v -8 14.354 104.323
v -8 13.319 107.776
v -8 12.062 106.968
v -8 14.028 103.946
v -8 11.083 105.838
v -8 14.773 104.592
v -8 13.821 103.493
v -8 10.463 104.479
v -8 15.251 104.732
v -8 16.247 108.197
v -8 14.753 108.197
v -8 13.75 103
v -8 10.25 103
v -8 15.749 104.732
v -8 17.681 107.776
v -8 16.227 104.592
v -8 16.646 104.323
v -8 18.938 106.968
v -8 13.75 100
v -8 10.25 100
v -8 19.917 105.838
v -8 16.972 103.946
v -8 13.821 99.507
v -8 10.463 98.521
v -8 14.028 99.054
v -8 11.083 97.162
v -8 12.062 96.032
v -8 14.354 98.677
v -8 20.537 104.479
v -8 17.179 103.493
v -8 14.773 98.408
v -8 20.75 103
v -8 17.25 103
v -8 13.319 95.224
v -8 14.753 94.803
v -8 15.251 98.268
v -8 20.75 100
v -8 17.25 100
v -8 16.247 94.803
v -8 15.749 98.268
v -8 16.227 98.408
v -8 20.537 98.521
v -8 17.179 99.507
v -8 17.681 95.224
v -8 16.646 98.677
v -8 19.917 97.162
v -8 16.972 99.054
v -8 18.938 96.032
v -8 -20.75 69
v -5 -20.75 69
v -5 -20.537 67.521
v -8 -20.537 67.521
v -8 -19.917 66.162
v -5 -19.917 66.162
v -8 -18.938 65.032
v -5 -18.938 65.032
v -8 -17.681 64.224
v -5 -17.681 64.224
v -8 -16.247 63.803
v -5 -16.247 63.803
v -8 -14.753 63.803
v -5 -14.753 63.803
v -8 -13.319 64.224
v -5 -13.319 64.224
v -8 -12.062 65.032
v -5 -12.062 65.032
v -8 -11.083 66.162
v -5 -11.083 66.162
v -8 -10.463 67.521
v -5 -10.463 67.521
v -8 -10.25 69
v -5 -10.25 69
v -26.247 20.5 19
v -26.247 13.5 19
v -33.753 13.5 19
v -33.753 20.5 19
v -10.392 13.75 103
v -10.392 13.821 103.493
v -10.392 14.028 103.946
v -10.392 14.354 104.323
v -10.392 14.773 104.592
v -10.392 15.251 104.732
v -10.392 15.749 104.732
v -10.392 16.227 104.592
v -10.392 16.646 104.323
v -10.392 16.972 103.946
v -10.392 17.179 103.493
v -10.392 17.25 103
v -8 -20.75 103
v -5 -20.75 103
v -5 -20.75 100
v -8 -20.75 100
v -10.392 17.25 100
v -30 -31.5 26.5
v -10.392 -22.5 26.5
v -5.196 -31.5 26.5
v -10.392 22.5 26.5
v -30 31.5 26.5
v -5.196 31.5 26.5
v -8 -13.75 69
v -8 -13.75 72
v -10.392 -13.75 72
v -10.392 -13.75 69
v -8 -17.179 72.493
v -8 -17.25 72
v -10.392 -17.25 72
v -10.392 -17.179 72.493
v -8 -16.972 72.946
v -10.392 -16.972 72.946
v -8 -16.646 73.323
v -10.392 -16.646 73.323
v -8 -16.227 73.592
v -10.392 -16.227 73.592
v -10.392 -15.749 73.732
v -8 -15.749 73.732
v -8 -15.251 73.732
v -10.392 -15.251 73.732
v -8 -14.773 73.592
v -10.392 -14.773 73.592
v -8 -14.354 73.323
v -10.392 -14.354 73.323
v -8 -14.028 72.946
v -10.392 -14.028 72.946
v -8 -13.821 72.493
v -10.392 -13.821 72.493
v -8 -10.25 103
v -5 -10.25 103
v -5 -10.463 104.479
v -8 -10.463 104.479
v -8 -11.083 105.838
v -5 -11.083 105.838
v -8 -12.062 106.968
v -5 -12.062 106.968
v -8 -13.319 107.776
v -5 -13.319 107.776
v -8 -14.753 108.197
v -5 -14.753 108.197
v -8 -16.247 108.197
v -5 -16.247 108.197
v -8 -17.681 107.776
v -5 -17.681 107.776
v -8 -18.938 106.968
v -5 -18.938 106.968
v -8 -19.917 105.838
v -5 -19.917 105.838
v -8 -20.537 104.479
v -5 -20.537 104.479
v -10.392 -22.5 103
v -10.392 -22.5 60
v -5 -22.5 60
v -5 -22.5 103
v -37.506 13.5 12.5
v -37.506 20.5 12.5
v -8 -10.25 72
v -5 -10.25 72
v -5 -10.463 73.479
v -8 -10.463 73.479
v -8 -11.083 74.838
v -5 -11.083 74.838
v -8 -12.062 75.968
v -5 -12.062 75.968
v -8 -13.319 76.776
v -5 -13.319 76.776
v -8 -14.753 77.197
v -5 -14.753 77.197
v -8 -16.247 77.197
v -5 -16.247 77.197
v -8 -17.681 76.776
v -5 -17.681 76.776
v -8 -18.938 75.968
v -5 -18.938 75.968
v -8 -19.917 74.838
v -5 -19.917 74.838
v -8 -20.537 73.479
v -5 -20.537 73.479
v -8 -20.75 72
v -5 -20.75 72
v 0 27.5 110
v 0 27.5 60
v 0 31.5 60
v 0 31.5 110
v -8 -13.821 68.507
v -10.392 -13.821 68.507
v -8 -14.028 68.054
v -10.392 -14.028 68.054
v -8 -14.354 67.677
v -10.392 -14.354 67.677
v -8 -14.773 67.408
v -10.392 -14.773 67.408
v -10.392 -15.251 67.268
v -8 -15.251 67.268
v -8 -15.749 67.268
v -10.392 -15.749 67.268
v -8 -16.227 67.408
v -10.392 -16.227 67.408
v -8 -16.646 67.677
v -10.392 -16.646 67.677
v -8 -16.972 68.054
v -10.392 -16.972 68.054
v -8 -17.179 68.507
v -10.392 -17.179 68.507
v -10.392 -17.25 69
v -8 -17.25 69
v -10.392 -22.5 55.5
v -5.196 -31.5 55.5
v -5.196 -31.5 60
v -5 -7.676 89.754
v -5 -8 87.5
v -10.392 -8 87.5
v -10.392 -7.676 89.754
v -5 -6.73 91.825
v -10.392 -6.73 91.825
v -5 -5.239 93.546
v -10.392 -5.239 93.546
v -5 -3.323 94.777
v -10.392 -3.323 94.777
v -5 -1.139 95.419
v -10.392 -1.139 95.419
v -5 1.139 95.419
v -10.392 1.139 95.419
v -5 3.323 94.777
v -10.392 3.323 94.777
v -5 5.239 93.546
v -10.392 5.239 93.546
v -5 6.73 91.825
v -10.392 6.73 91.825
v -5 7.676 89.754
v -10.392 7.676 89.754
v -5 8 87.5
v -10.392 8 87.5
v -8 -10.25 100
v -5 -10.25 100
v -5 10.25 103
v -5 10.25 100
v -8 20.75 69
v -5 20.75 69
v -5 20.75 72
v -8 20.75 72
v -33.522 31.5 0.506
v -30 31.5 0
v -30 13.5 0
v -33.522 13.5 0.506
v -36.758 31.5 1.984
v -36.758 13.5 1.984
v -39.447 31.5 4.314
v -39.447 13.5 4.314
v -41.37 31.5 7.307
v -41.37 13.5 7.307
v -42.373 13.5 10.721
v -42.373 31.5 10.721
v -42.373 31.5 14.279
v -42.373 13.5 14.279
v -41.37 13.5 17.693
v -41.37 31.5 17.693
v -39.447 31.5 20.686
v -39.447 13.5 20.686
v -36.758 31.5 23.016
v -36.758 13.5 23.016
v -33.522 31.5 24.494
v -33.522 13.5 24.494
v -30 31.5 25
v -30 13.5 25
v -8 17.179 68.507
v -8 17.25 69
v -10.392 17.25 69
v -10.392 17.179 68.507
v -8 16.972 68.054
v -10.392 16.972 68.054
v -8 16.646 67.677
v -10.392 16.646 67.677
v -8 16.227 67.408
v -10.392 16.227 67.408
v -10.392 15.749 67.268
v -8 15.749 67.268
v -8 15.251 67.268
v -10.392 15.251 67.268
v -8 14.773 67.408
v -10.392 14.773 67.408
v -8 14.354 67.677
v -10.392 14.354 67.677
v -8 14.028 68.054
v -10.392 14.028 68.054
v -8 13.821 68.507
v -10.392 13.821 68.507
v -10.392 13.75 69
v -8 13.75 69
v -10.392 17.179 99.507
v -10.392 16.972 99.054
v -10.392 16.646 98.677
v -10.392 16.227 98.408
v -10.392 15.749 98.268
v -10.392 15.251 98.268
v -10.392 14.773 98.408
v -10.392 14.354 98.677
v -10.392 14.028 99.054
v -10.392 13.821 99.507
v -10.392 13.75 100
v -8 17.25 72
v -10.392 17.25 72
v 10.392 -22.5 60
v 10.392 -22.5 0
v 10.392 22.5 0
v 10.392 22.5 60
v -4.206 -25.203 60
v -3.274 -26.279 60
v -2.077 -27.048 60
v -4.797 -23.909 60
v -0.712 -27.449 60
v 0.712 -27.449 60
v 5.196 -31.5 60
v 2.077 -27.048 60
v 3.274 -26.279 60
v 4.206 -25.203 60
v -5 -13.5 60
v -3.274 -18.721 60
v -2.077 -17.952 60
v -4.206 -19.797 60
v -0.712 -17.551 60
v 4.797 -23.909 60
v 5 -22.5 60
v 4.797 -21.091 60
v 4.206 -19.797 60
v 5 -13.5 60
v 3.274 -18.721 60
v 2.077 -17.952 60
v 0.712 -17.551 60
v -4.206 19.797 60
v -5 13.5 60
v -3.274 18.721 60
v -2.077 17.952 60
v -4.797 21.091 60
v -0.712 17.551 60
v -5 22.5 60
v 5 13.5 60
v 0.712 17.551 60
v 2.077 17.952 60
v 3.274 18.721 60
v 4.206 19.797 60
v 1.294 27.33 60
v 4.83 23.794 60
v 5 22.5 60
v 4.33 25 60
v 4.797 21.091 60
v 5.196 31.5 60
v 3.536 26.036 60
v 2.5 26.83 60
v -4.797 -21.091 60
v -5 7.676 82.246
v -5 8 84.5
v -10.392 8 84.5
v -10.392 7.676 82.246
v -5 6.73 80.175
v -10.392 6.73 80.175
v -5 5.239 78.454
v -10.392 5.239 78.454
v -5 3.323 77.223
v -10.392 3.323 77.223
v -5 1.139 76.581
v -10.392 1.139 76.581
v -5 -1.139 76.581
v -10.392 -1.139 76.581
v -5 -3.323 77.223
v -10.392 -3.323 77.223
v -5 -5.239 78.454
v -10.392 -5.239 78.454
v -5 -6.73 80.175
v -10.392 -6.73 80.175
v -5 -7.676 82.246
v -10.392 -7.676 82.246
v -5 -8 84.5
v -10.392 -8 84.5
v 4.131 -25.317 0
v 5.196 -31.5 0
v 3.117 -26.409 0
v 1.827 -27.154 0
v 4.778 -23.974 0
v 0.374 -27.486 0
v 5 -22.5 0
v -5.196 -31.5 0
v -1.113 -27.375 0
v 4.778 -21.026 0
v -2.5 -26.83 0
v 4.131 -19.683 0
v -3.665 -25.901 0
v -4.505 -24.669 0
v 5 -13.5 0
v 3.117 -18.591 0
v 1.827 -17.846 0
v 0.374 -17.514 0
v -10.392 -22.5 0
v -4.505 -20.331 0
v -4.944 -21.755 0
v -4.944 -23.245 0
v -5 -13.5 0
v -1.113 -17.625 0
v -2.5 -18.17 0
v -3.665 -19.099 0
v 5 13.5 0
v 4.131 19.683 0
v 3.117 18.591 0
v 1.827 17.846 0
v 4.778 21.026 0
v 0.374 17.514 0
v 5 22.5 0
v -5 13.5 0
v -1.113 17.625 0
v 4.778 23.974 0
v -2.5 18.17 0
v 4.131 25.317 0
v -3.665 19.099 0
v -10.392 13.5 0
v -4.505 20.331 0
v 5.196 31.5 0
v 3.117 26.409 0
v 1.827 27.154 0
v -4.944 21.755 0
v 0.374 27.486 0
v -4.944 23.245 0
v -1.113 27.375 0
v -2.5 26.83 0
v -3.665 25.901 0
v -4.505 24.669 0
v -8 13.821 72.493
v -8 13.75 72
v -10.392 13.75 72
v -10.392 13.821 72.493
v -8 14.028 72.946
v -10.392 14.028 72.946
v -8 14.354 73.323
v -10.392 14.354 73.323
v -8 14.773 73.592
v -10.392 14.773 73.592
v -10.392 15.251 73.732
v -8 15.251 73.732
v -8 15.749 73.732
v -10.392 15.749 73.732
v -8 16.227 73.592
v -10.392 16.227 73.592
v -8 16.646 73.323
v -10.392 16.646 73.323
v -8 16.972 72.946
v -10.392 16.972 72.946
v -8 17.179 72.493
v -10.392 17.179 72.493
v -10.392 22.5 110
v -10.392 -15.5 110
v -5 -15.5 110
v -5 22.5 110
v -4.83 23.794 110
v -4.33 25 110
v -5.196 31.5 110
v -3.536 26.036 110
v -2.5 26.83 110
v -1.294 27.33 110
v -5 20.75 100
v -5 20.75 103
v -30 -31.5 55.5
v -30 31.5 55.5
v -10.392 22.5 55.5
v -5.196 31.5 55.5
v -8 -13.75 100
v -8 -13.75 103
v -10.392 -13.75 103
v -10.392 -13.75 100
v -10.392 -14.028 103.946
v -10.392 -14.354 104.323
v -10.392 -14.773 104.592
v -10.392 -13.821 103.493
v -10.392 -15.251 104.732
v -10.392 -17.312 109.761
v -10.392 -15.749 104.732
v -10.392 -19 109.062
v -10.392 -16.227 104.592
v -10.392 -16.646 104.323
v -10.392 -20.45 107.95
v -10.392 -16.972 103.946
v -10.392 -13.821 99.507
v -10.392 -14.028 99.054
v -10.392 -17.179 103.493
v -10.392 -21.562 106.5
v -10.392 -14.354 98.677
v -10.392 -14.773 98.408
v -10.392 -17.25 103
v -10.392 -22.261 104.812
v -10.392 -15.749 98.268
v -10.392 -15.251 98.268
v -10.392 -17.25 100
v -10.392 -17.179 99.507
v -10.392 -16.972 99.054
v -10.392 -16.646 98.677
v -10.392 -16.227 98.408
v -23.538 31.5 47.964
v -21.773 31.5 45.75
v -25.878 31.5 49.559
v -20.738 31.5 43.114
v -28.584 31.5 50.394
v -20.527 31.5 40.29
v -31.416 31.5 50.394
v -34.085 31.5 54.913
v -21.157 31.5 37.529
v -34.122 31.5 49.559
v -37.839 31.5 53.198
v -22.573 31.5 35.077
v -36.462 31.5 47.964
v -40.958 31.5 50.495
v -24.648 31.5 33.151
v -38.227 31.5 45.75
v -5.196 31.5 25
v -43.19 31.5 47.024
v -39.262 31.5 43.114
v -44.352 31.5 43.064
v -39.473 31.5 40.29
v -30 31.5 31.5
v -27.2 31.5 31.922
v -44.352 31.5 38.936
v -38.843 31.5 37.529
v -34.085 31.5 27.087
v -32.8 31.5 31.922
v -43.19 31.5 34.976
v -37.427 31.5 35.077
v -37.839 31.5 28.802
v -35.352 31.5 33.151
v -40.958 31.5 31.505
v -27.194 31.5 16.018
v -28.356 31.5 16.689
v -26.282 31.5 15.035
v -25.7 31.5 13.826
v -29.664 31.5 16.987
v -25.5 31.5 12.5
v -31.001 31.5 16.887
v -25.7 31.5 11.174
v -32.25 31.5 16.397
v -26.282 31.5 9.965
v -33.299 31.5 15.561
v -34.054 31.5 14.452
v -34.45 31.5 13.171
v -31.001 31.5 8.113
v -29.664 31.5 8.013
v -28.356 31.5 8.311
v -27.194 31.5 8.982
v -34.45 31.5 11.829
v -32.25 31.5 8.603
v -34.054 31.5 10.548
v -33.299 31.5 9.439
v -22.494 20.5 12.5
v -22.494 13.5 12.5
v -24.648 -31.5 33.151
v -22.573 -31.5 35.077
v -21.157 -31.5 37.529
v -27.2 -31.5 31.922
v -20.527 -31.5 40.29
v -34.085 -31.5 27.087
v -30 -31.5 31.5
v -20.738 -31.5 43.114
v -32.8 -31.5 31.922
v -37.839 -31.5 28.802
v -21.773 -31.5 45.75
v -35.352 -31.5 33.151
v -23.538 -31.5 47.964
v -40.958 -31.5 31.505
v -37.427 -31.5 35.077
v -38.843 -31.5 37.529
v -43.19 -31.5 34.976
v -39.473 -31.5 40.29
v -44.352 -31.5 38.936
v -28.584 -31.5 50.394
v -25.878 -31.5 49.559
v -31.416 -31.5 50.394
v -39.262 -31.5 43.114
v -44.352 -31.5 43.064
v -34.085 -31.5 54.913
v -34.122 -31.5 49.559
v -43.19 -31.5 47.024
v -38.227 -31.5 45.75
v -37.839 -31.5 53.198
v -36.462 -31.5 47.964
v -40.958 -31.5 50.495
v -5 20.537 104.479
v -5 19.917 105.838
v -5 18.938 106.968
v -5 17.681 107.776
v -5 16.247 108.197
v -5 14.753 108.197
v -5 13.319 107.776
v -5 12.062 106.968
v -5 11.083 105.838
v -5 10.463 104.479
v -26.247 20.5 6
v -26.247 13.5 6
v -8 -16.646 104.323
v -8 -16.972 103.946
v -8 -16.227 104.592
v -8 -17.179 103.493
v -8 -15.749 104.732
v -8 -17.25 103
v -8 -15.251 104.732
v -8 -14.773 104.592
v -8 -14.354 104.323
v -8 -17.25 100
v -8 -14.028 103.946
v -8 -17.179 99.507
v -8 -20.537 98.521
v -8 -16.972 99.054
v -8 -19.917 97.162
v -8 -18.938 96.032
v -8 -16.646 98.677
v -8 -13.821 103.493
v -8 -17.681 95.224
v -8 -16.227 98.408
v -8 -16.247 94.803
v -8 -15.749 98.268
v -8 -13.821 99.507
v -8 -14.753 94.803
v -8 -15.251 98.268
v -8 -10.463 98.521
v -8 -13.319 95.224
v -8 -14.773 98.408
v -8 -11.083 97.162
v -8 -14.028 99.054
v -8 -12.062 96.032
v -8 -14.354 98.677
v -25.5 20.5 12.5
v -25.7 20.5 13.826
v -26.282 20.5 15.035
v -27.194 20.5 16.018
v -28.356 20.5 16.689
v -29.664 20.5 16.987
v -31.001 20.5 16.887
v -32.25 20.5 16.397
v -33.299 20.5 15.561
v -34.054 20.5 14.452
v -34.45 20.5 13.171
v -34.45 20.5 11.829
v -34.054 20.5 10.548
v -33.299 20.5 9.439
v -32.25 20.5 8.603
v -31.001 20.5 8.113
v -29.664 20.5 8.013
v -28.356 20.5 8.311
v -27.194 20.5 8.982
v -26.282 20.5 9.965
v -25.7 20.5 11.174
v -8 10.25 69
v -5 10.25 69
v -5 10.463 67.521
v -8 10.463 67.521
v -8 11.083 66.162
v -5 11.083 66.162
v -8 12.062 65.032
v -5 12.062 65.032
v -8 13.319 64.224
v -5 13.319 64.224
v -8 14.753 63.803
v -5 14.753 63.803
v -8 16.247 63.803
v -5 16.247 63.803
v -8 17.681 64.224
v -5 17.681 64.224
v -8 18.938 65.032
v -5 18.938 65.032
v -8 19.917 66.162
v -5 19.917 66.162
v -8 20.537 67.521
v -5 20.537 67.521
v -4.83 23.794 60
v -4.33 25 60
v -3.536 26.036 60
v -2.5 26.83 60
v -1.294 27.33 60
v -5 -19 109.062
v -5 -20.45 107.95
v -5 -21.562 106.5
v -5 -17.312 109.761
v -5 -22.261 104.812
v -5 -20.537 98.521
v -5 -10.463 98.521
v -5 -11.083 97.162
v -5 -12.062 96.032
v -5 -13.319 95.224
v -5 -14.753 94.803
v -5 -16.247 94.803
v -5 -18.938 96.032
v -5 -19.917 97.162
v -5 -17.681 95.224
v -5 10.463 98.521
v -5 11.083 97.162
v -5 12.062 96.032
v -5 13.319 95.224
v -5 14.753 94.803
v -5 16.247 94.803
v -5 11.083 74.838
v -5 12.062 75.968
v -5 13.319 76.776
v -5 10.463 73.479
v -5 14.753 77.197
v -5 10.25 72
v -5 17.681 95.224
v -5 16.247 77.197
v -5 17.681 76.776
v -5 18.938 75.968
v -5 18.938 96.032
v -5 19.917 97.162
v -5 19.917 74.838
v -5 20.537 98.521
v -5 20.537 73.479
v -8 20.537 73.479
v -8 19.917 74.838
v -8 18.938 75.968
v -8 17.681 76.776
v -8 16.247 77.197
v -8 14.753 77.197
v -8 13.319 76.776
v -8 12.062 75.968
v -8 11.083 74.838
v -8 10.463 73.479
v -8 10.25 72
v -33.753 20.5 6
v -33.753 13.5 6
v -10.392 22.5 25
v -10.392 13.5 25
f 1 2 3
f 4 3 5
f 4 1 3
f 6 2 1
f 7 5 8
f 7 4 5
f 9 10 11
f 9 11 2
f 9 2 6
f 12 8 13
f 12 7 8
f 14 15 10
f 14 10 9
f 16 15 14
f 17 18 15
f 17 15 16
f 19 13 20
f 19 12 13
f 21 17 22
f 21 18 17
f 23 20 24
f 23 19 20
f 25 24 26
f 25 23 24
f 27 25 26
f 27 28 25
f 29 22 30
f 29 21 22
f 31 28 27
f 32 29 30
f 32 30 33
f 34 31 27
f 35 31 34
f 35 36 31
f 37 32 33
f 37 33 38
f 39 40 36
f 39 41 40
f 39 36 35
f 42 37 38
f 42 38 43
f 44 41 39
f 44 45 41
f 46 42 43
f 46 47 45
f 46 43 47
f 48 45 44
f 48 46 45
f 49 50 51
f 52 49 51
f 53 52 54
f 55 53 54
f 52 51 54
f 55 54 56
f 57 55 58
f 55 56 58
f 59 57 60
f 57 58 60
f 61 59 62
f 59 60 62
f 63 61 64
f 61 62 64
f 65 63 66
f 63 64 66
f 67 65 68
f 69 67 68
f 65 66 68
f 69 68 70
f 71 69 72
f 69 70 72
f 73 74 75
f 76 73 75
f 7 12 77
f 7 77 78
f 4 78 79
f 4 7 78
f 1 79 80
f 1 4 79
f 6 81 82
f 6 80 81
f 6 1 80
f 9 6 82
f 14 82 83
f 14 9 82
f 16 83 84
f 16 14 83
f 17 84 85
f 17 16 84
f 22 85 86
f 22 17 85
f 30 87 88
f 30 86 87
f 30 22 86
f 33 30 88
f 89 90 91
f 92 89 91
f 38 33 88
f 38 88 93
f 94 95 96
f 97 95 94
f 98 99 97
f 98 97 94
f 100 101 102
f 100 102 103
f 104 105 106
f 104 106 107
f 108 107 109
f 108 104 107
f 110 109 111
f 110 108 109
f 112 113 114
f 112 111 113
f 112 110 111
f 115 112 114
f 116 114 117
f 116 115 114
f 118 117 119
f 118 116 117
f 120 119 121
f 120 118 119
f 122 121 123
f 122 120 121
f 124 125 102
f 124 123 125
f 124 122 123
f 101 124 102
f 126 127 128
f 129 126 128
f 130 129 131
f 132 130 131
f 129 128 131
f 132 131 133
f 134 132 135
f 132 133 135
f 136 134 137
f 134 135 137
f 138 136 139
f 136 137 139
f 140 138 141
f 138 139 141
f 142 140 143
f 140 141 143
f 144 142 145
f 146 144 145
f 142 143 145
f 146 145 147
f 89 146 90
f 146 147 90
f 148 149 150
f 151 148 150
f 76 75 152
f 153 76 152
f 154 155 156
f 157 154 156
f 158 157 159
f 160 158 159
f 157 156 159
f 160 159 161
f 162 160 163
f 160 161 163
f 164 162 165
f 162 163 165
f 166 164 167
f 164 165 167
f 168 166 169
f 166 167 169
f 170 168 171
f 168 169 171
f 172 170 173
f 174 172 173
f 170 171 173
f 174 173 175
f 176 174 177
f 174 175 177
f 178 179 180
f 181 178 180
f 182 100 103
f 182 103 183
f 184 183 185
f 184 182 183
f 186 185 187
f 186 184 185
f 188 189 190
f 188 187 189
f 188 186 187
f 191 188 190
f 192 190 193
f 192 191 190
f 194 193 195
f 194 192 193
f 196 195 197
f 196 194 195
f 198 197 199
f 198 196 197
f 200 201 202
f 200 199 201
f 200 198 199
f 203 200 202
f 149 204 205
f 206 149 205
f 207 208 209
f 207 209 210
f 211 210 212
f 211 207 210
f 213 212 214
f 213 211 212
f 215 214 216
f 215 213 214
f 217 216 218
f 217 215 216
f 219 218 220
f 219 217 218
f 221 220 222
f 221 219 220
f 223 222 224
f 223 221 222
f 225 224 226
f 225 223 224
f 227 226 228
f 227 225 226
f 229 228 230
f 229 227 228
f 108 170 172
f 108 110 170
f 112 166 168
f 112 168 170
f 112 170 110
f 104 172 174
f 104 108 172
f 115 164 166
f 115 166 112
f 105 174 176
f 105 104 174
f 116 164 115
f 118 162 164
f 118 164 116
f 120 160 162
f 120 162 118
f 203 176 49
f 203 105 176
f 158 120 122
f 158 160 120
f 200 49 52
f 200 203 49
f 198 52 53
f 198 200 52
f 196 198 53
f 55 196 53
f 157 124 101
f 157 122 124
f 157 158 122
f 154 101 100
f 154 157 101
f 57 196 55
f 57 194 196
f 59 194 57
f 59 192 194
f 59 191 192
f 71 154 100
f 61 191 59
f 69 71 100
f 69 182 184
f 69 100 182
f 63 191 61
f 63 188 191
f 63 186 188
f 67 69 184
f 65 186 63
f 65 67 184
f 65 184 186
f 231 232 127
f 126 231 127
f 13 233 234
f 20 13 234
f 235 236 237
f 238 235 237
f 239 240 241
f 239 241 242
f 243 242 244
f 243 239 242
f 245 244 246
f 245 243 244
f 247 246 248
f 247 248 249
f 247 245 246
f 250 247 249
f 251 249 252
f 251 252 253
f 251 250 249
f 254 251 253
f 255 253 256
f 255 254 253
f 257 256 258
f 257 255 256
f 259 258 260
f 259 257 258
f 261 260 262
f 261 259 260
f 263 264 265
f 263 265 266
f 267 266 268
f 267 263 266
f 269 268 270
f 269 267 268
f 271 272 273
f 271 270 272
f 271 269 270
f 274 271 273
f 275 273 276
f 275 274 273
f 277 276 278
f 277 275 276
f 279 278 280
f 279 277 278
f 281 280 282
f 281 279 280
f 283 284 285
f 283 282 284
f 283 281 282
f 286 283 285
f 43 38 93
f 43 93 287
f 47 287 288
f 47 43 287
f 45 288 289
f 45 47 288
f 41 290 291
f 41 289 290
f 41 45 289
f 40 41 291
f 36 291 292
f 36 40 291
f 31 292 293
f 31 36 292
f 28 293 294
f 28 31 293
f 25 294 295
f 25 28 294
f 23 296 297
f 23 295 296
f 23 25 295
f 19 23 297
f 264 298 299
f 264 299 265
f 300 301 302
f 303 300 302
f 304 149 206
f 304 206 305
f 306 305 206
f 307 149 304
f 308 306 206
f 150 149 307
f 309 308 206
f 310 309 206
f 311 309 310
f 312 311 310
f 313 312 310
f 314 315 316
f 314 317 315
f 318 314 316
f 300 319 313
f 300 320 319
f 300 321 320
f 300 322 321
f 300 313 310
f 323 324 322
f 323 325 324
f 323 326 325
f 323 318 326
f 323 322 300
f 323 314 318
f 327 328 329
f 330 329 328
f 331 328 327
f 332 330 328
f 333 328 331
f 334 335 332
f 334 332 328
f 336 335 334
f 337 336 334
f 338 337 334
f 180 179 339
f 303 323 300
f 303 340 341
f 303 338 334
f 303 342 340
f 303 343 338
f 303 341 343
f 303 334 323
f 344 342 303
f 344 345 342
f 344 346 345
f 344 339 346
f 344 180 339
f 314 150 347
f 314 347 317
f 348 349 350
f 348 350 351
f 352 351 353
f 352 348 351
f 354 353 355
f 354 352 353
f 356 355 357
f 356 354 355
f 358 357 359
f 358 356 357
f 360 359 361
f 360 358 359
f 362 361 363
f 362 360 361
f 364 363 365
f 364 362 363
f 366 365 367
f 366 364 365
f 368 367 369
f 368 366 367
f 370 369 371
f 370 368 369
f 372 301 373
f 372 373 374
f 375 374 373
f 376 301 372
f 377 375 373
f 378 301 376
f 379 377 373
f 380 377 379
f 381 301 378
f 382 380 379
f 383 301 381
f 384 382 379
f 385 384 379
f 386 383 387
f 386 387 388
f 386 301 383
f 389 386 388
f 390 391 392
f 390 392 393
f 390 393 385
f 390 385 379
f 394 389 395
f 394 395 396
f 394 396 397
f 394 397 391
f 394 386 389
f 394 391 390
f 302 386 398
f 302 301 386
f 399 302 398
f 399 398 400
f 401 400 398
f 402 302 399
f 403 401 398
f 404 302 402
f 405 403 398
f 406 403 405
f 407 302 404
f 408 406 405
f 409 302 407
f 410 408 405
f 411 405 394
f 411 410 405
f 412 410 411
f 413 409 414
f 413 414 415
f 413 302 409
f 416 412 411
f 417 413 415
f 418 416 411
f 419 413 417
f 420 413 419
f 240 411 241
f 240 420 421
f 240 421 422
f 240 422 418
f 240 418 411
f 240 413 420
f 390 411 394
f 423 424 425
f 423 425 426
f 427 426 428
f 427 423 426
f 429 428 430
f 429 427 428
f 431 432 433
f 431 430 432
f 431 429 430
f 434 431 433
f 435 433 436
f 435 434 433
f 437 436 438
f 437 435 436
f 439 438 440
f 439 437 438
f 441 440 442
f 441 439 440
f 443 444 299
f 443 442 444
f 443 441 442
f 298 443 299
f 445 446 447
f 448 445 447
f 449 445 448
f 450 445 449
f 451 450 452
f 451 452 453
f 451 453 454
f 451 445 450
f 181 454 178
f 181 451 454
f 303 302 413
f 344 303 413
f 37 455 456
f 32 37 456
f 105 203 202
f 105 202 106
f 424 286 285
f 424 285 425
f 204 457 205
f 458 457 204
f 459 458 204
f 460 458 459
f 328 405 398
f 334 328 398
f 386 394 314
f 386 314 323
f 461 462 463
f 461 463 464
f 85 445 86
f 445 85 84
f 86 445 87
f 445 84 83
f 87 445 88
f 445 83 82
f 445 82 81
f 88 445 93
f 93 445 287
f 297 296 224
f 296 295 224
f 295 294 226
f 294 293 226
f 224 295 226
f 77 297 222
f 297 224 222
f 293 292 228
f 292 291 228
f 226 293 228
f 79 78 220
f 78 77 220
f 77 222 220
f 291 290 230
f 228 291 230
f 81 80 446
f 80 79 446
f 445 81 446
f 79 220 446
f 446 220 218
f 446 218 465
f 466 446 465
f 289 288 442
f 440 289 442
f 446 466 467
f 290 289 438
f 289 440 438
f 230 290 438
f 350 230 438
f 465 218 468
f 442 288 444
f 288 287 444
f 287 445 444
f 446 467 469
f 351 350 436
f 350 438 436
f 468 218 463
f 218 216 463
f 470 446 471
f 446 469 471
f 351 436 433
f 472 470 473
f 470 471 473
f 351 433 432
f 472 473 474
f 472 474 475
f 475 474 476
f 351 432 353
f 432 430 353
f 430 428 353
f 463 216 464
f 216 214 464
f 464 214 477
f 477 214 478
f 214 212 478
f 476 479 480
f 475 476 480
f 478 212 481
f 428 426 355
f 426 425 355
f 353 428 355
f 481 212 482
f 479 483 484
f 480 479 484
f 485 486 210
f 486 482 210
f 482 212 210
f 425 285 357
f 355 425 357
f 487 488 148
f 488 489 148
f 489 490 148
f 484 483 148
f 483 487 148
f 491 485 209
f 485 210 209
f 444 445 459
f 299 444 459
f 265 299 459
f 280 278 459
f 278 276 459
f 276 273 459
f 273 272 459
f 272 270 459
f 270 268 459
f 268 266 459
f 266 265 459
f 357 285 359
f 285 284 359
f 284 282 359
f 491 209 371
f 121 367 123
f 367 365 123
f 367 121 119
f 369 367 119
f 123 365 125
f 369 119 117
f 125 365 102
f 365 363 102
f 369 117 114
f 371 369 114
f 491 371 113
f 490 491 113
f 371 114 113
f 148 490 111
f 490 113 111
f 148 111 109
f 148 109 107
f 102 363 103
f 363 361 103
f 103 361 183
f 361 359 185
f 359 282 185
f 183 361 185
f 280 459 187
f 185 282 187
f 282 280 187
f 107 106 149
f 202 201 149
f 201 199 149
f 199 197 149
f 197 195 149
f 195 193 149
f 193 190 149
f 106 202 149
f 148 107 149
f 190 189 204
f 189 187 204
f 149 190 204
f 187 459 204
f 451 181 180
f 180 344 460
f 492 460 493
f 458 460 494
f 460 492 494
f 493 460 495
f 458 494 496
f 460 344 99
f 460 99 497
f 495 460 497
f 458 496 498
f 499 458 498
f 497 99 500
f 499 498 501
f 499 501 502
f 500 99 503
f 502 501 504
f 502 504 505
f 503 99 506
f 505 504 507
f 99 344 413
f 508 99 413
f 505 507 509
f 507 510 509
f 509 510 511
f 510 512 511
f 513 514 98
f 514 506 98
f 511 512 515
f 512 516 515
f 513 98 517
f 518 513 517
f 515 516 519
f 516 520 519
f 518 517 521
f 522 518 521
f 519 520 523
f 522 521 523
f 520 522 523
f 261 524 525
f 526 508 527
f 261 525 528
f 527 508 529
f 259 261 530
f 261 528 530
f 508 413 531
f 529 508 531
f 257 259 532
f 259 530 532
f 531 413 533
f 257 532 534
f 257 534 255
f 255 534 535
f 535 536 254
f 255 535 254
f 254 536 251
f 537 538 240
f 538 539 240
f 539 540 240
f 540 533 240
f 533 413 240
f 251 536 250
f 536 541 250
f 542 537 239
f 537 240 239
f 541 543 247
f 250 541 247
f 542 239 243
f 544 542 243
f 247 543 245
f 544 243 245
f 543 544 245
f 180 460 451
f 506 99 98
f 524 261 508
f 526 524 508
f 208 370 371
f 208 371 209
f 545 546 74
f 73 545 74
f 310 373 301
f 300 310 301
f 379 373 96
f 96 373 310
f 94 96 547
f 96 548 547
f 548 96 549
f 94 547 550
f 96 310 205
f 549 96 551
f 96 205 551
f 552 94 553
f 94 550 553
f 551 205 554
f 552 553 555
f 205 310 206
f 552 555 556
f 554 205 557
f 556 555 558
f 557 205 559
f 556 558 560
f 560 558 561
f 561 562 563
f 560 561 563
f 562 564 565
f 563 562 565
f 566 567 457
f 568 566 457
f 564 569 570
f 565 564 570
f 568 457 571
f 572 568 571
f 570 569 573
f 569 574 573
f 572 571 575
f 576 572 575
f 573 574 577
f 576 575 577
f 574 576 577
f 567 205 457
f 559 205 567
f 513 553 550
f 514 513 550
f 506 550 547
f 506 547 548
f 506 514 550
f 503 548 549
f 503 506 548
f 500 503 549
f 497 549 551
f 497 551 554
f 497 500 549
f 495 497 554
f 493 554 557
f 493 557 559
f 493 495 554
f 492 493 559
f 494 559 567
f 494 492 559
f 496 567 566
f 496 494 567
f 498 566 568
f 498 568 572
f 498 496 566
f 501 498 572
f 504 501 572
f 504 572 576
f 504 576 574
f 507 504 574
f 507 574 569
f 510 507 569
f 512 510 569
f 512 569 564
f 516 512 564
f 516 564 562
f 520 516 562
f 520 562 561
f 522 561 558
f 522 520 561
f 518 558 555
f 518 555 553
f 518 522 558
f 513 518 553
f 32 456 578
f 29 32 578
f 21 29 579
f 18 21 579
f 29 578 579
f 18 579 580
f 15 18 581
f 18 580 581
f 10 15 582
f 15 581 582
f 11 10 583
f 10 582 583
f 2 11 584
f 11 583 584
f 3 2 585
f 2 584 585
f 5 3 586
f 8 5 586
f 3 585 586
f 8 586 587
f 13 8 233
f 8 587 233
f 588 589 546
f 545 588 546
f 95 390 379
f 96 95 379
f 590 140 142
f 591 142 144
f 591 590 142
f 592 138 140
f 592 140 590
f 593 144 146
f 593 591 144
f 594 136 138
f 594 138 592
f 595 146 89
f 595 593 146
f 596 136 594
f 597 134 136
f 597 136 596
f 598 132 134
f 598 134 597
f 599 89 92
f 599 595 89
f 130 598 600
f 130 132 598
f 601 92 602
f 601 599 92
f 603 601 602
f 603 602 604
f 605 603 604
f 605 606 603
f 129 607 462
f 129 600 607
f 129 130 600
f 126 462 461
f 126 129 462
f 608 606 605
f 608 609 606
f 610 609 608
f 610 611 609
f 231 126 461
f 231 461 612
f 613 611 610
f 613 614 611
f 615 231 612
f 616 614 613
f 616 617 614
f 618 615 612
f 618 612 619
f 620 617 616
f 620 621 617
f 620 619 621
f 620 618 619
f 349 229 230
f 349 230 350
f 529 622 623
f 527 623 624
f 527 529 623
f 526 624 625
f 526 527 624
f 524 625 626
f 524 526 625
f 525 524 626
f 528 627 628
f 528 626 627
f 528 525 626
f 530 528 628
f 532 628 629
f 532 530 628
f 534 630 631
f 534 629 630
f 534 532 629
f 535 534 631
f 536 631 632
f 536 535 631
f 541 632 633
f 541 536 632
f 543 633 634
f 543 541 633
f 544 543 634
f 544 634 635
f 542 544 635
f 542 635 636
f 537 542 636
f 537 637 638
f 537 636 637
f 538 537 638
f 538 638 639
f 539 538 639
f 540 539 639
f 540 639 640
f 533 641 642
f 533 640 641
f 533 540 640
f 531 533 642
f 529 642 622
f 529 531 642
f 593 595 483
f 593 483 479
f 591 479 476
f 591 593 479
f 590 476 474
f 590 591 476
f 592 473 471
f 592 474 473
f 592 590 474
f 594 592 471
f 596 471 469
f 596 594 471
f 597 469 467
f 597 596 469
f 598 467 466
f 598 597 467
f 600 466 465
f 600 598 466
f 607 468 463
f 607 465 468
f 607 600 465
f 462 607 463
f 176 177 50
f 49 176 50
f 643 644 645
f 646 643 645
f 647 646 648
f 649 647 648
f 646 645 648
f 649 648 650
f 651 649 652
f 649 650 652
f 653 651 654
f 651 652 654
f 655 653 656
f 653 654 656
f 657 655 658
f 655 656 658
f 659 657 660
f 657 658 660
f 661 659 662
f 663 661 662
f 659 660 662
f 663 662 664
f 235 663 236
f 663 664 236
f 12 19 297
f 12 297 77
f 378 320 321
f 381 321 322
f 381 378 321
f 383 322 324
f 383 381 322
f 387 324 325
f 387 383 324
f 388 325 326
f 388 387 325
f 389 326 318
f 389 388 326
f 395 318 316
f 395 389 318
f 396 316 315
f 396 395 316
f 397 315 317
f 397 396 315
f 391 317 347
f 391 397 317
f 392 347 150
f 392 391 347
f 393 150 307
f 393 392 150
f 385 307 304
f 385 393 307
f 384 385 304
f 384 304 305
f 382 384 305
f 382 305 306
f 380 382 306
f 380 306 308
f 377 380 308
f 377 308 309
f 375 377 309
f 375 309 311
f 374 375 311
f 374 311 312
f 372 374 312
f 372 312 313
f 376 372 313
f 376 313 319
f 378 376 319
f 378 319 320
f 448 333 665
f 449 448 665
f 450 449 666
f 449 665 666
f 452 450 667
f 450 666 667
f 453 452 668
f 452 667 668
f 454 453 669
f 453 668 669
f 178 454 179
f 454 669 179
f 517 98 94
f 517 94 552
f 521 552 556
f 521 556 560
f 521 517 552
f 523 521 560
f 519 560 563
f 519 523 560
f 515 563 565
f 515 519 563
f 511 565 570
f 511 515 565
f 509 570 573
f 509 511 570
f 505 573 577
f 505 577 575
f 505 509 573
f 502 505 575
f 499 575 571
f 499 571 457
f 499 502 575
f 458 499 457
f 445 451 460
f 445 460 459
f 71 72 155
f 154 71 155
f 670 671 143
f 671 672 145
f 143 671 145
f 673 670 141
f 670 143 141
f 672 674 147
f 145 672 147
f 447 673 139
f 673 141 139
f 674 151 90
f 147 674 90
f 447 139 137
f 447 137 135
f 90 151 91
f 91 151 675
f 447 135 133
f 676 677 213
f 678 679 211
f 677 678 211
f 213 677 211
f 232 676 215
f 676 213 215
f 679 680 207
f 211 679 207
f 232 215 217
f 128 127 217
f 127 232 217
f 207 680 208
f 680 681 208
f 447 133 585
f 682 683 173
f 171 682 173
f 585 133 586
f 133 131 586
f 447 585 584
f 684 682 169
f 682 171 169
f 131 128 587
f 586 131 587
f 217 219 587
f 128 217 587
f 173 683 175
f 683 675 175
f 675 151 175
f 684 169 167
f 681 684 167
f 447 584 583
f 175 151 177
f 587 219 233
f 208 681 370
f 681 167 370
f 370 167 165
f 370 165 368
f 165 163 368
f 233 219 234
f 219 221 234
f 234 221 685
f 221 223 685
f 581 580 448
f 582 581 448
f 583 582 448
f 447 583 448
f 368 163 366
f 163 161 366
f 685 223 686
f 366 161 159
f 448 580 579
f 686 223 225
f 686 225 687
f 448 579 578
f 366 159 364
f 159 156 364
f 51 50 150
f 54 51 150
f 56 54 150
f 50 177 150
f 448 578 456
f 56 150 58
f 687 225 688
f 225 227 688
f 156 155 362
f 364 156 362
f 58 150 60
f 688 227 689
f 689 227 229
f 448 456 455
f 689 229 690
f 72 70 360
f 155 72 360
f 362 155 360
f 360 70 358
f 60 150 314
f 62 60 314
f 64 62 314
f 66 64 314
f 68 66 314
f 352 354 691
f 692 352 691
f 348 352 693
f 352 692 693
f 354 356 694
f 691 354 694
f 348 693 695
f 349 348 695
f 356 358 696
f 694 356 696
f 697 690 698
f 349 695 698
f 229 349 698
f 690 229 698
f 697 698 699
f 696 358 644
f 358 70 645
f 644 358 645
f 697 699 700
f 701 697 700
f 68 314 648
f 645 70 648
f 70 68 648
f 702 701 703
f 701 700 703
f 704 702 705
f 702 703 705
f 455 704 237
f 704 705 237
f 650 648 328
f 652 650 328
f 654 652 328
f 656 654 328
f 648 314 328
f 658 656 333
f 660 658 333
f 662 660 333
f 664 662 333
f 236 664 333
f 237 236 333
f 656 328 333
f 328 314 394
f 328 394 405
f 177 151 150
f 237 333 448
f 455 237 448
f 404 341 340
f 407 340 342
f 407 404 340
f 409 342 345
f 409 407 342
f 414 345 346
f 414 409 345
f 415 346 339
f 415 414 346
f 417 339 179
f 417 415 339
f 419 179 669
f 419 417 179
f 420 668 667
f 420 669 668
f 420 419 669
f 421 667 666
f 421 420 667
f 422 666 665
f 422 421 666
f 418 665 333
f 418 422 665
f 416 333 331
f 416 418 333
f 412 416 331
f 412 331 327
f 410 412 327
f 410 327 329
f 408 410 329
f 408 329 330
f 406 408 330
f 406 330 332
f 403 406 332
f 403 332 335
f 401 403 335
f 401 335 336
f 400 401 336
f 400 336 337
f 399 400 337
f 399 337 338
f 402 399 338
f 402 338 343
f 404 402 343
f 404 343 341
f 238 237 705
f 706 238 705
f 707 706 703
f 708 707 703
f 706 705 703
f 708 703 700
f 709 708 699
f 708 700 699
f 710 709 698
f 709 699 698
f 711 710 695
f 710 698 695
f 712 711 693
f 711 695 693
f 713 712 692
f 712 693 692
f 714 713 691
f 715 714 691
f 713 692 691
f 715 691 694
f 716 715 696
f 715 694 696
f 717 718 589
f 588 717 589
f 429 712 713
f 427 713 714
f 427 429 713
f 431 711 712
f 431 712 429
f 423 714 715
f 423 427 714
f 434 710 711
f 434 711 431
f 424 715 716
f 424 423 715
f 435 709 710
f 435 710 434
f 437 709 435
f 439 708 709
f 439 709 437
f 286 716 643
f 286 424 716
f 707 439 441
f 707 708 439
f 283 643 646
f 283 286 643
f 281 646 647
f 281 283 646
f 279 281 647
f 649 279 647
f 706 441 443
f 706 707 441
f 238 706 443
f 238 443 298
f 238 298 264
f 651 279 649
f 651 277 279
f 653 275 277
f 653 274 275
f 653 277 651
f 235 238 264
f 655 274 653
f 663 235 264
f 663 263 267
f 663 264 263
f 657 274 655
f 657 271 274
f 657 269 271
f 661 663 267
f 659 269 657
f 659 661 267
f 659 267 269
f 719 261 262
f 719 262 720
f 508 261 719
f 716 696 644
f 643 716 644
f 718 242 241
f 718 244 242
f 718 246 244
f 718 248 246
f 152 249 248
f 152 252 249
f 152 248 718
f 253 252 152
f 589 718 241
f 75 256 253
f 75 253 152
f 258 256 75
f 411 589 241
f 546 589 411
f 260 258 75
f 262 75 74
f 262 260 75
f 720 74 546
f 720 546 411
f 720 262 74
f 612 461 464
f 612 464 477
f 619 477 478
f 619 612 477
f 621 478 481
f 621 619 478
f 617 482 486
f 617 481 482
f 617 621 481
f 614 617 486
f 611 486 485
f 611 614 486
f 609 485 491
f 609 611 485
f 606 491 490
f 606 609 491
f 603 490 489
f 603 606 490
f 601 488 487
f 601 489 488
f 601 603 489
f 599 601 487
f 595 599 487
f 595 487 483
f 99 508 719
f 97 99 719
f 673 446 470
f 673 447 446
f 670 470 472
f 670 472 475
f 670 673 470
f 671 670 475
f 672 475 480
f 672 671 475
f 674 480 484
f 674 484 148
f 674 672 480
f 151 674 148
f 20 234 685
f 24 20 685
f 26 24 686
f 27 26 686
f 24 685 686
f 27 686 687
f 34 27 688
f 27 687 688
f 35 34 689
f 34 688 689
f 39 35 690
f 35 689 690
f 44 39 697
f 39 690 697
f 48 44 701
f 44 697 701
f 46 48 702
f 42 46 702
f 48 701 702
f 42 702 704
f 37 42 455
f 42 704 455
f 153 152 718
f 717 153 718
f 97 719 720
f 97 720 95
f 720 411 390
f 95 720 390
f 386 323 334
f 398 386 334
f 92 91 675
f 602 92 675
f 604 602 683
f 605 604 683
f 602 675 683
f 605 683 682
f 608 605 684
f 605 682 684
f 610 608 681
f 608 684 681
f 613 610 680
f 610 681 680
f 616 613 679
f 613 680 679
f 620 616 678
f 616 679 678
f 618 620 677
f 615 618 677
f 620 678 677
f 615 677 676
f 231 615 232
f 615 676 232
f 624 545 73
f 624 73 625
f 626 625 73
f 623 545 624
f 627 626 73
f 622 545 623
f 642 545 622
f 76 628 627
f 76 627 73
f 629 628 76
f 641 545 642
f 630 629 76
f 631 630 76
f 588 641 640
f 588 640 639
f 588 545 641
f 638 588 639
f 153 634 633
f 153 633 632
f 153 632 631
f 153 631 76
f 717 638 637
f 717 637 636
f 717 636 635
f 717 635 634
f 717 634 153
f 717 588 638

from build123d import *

# Parameters (mm, degrees)
SKETCH1_R           = 5
SKETCH1_W           = 10
SKETCH1_H           = 27
BOSS_EXTRUDE1_DEPTH = 60
BOSS_EXTRUDE2_REACH = 89.618
SKETCH2_R           = 4.5
CUT_EXTRUDE1_DEPTH  = 7
BOSS_EXTRUDE3_START = -63
SKETCH4_R           = 9.5
BOSS_EXTRUDE3_DEPTH = 63
BOSS_EXTRUDE5_DEPTH = 50
CUT_EXTRUDE16_DEPTH = 20
CUT_EXTRUDE2_DEPTH  = 3
FILLET1_R           = 7


with BuildPart() as part:
    # Sketch1 → Boss-Extrude1 (new body)
    with BuildSketch(Plane.XY):
        Polygon((-10.392304845, 22.5), (-10.392304845, -22.5), (-5.196152423, -31.5), (5.196152423, -31.5), (10.392304845, -22.5), (10.392304845, 22.5), (5.196152423, 31.5), (-5.196152423, 31.5), align=None)
        with Locations((0, 22.5)):
            Circle(SKETCH1_R, mode=Mode.SUBTRACT)
        with Locations((0, -22.5)):
            Circle(SKETCH1_R, mode=Mode.SUBTRACT)
        Rectangle(SKETCH1_W, SKETCH1_H, mode=Mode.SUBTRACT)
    extrude(amount=BOSS_EXTRUDE1_DEPTH)

    # Boss-Extrude2: up to this face of the body (flat: up to its plane)
    boss_extrude2_end = Plane(part.part.faces().sort_by_distance((0, 13.5, 30))[0])
    # Sketch2 → Boss-Extrude2 (add, up to the picked face)
    with BuildSketch(Plane.XZ.offset(-31.5), mode=Mode.PRIVATE) as boss_extrude2_sk1:
        with BuildLine():
            Line((-30, 25), (-5.196152423, 25))
            Line((-5.196152423, 25), (-5.196152423, 0))
            Line((-5.196152423, 0), (-30, 0))
            ThreePointArc((-30, 0), (-42.5, 12.5), (-30, 25))
        make_face()
        with Locations((-30, 12.5)):
            Circle(SKETCH2_R, mode=Mode.SUBTRACT)
    boss_extrude2_tool1 = split(extrude(boss_extrude2_sk1.sketch, amount=BOSS_EXTRUDE2_REACH, mode=Mode.PRIVATE), bisect_by=boss_extrude2_end, keep=Keep.BOTH, mode=Mode.PRIVATE)
    add(boss_extrude2_tool1.solids().sort_by(Axis((-22.0337, 31.5, 12.5), (0, -1, 0)))[0])

    # Sketch3 → Cut-Extrude1 (cut)
    with BuildSketch(Plane(origin=(0, 13.5, 0), x_dir=(-1, 0, 0), z_dir=(0, -1, 0))):
        Polygon((33.75277675, -6), (26.24722325, -6), (22.494446501, -12.5), (26.24722325, -19), (33.75277675, -19), (37.505553499, -12.5), align=None)
    extrude(amount=-CUT_EXTRUDE1_DEPTH, mode=Mode.SUBTRACT)

    # Sketch4 → Boss-Extrude3 (add)
    with BuildSketch(Plane.XZ.offset(31.5).offset(BOSS_EXTRUDE3_START)):
        with BuildLine():
            Line((-30, 55.5), (-5.196152423, 55.5))
            Line((-5.196152423, 55.5), (-5.196152423, 26.5))
            Line((-5.196152423, 26.5), (-30, 26.5))
            ThreePointArc((-30, 26.5), (-44.5, 41), (-30, 55.5))
        make_face()
        with Locations(Location((-30, 41, 0), (0, 0, 270))):
            Circle(SKETCH4_R, mode=Mode.SUBTRACT)
    extrude(amount=BOSS_EXTRUDE3_DEPTH)

    # Sketch34 → Boss-Extrude5 (add)
    with BuildSketch(Plane.XY.offset(60)):
        with BuildLine():
            Line((-10.392304845, 22.5), (-10.392304845, -22.5))
            Line((-10.392304845, -22.5), (-5, -22.5))
            Line((-5, -22.5), (-5, 22.5))
            ThreePointArc((-5, 22.5), (-3.535533906, 26.035533906), (0, 27.5))
            Line((0, 27.5), (0, 31.5))
            Line((0, 31.5), (-5.196152423, 31.5))
            Line((-5.196152423, 31.5), (-10.392304845, 22.5))
        make_face()
    extrude(amount=BOSS_EXTRUDE5_DEPTH)

    # Sketch26 → Cut-Extrude16 (cut)
    with BuildSketch(Plane(origin=(-5, -6.617020142, 13.078335781), x_dir=(0, 0, -1), z_dir=(1, 0, 0))):
        with BuildLine():
            Line((-89.921664219, 23.867020142), (-86.921664219, 23.867020142))
            ThreePointArc((-86.921664219, 23.867020142), (-85.171664219, 22.117020142), (-86.921664219, 20.367020142))
            Line((-86.921664219, 20.367020142), (-89.921664219, 20.367020142))
            ThreePointArc((-89.921664219, 20.367020142), (-91.671664219, 22.117020142), (-89.921664219, 23.867020142))
        make_face()
        with BuildLine():
            Line((-58.921664219, 23.867020142), (-55.921664219, 23.867020142))
            ThreePointArc((-55.921664219, 23.867020142), (-54.171664219, 22.117020142), (-55.921664219, 20.367020142))
            Line((-55.921664219, 20.367020142), (-58.921664219, 20.367020142))
            ThreePointArc((-58.921664219, 20.367020142), (-60.671664219, 22.117020142), (-58.921664219, 23.867020142))
        make_face()
        with BuildLine():
            Line((-58.921664219, -7.132979858), (-55.921664219, -7.132979858))
            ThreePointArc((-55.921664219, -7.132979858), (-54.171664219, -8.882979858), (-55.921664219, -10.632979858))
            Line((-55.921664219, -10.632979858), (-58.921664219, -10.632979858))
            ThreePointArc((-58.921664219, -10.632979858), (-60.671664219, -8.882979858), (-58.921664219, -7.132979858))
        make_face()
        with BuildLine():
            Line((-89.921664219, -7.132979858), (-86.921664219, -7.132979858))
            ThreePointArc((-86.921664219, -7.132979858), (-85.171664219, -8.882979858), (-86.921664219, -10.632979858))
            Line((-86.921664219, -10.632979858), (-89.921664219, -10.632979858))
            ThreePointArc((-89.921664219, -10.632979858), (-91.671664219, -8.882979858), (-89.921664219, -7.132979858))
        make_face()
        with BuildLine():
            Line((-74.421664219, 14.617020142), (-71.421664219, 14.617020142))
            ThreePointArc((-71.421664219, 14.617020142), (-63.421664219, 6.617020142), (-71.421664219, -1.382979858))
            Line((-71.421664219, -1.382979858), (-74.421664219, -1.382979858))
            ThreePointArc((-74.421664219, -1.382979858), (-82.421664219, 6.617020142), (-74.421664219, 14.617020142))
        make_face()
    extrude(amount=-CUT_EXTRUDE16_DEPTH, mode=Mode.SUBTRACT)

    # Sketch37 → Cut-Extrude2 (cut)
    with BuildSketch(Plane(origin=(-5, 8.494761854, 122.050976771), x_dir=(0, 0, -1), z_dir=(1, 0, 0))):
        with BuildLine():
            Line((22.050976771, 12.255238146), (19.050976771, 12.255238146))
            ThreePointArc((19.050976771, 12.255238146), (13.800976771, 7.005238146), (19.050976771, 1.755238146))
            Line((19.050976771, 1.755238146), (22.050976771, 1.755238146))
            ThreePointArc((22.050976771, 1.755238146), (27.300976771, 7.005238146), (22.050976771, 12.255238146))
        make_face()
        with BuildLine():
            Line((53.050976771, 12.255238146), (50.050976771, 12.255238146))
            ThreePointArc((50.050976771, 12.255238146), (44.800976771, 7.005238146), (50.050976771, 1.755238146))
            Line((50.050976771, 1.755238146), (53.050976771, 1.755238146))
            ThreePointArc((53.050976771, 1.755238146), (58.300976771, 7.005238146), (53.050976771, 12.255238146))
        make_face()
        with BuildLine():
            Line((53.050976771, -18.744761854), (50.050976771, -18.744761854))
            ThreePointArc((50.050976771, -18.744761854), (44.800976771, -23.994761854), (50.050976771, -29.244761854))
            Line((50.050976771, -29.244761854), (53.050976771, -29.244761854))
            ThreePointArc((53.050976771, -29.244761854), (58.300976771, -23.994761854), (53.050976771, -18.744761854))
        make_face()
        with BuildLine():
            Line((19.050976771, -29.244761854), (22.050976771, -29.244761854))
            ThreePointArc((22.050976771, -29.244761854), (27.300976771, -23.994761854), (22.050976771, -18.744761854))
            Line((22.050976771, -18.744761854), (19.050976771, -18.744761854))
            ThreePointArc((19.050976771, -18.744761854), (13.800976771, -23.994761854), (19.050976771, -29.244761854))
        make_face()
    extrude(amount=-CUT_EXTRUDE2_DEPTH, mode=Mode.SUBTRACT)

    # Fillet1
    fillet1_edges = [part.edges().sort_by_distance(p)[0] for p in [
        (-7.696152423, -22.5, 110),
    ]]
    fillet(fillet1_edges, radius=FILLET1_R)


solid = part.part
